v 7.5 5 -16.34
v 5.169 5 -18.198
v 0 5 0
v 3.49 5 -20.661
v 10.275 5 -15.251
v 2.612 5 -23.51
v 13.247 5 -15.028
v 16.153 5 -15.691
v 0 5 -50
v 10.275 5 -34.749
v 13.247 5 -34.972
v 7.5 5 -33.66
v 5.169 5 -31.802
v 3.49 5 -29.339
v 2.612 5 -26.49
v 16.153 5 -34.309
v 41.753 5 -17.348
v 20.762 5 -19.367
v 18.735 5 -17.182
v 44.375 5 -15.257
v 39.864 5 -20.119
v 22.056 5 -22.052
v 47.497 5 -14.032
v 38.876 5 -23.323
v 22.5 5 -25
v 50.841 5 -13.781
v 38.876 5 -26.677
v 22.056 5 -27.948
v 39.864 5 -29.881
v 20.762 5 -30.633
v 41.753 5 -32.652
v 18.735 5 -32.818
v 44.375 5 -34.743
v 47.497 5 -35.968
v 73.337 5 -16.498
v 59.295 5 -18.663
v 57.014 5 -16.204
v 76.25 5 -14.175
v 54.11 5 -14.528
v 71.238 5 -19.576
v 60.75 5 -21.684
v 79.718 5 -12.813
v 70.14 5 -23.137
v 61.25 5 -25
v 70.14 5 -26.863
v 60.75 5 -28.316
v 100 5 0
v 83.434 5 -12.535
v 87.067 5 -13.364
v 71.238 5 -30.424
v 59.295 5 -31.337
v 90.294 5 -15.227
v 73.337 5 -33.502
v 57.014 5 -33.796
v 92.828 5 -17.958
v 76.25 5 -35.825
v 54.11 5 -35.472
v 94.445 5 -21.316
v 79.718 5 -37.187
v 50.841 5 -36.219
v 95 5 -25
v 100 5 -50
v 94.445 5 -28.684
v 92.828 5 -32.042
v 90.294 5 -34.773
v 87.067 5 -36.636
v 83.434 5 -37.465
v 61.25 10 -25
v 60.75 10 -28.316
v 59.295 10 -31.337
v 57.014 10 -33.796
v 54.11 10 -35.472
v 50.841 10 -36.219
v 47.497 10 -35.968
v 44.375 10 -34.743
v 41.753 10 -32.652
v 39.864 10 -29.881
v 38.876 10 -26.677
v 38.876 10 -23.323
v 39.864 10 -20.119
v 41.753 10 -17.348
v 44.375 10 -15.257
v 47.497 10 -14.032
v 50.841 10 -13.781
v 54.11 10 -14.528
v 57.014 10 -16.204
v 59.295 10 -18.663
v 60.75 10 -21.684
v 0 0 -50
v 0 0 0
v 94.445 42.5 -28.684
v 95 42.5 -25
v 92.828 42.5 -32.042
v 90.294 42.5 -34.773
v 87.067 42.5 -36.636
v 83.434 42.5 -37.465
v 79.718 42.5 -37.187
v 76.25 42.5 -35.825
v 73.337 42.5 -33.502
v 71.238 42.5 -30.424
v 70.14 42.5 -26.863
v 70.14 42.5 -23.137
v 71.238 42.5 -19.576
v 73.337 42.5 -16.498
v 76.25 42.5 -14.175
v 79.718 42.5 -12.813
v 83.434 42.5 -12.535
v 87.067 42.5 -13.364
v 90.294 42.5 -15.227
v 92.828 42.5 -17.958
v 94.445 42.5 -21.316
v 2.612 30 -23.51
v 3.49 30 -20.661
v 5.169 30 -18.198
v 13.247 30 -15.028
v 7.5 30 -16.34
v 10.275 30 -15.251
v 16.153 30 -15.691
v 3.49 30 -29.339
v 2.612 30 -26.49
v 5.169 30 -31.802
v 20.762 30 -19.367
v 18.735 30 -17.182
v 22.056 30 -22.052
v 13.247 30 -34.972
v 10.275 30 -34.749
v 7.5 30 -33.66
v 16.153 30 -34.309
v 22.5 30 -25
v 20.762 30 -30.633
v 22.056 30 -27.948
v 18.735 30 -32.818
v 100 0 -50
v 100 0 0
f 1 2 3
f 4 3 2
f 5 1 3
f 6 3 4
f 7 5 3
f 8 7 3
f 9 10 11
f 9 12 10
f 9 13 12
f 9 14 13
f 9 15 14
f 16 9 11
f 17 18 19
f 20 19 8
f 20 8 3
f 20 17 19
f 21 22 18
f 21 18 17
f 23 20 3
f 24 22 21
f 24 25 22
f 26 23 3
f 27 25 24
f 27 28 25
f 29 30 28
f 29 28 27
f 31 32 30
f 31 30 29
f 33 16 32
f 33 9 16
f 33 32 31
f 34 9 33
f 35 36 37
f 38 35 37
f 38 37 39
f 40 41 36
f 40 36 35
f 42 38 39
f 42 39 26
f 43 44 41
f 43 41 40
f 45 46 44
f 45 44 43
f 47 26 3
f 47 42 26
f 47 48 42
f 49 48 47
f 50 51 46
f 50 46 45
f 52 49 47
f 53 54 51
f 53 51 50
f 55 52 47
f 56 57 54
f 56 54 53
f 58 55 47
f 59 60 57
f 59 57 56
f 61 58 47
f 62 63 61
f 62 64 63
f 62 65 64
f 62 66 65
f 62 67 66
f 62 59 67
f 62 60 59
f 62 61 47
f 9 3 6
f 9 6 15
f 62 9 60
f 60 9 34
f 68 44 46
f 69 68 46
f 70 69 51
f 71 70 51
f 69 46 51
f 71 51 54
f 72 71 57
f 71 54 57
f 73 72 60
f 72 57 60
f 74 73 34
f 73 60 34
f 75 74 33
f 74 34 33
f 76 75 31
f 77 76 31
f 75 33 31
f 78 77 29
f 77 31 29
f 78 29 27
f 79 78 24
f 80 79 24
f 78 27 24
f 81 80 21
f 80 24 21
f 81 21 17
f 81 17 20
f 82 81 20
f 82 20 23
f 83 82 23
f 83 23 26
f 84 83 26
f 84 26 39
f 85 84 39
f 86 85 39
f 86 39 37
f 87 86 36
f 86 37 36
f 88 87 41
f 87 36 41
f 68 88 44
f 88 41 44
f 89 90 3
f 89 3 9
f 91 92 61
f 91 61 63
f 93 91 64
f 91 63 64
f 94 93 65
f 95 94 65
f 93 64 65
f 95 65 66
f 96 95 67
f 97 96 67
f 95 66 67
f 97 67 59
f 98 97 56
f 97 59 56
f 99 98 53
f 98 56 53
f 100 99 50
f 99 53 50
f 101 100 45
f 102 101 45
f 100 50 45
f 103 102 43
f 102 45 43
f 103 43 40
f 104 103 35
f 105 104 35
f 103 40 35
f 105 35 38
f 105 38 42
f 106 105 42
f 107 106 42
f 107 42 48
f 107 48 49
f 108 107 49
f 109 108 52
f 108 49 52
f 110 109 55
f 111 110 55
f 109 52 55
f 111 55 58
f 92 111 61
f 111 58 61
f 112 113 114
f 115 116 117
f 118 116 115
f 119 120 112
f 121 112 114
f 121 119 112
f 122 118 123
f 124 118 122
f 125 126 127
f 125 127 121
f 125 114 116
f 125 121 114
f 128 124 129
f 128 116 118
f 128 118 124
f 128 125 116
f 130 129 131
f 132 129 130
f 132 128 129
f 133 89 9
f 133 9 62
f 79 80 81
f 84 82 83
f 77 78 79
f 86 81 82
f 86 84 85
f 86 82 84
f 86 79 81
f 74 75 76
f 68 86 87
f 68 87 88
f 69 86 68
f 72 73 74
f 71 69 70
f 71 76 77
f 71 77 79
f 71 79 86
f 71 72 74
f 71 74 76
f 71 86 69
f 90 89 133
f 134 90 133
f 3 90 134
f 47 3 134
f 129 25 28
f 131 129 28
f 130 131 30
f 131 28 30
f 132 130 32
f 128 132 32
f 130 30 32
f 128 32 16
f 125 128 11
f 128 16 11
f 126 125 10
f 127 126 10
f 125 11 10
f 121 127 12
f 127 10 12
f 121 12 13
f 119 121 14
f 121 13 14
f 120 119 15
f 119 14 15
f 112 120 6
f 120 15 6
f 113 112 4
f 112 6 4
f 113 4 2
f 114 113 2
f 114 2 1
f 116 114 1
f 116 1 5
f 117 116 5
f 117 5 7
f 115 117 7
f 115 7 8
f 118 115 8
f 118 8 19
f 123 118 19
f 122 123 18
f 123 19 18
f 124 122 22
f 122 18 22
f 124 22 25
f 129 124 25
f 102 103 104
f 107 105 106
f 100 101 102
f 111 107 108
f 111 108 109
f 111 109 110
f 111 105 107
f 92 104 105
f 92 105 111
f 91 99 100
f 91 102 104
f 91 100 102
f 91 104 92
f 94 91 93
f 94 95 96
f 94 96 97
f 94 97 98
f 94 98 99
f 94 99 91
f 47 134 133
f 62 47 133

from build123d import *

# Parameters (mm, degrees)
SKETCH1_W           = 100
SKETCH1_H           = 50
BOSS_EXTRUDE1_DEPTH = 5
SKETCH3_R           = 10
BOSS_EXTRUDE2_DEPTH = 25
SKETCH4_R           = 11.25
BOSS_EXTRUDE3_DEPTH = 5
SKETCH5_R           = 12.5
BOSS_EXTRUDE4_DEPTH = 37.5


with BuildPart() as part:
    # Sketch1 → Boss-Extrude1 (new body)
    with BuildSketch(Plane(origin=(0, 0, 0), x_dir=(1, 0, 0), z_dir=(0, 1, 0))):
        with Locations((50, 25)):
            Rectangle(SKETCH1_W, SKETCH1_H)
    extrude(amount=BOSS_EXTRUDE1_DEPTH)

    # Sketch3 → Boss-Extrude2 (add)
    with BuildSketch(Plane(origin=(0, 5, 0), x_dir=(1, 0, 0), z_dir=(0, 1, 0))):
        with Locations((12.5, 25)):
            Circle(SKETCH3_R)
    extrude(amount=BOSS_EXTRUDE2_DEPTH)

    # Sketch4 → Boss-Extrude3 (add)
    with BuildSketch(Plane(origin=(0, 5, 0), x_dir=(1, 0, 0), z_dir=(0, 1, 0))):
        with Locations((50, 25)):
            Circle(SKETCH4_R)
    extrude(amount=BOSS_EXTRUDE3_DEPTH)

    # Sketch5 → Boss-Extrude4 (add)
    with BuildSketch(Plane(origin=(0, 5, 0), x_dir=(1, 0, 0), z_dir=(0, 1, 0))):
        with Locations((82.5, 25)):
            Circle(SKETCH5_R)
    extrude(amount=BOSS_EXTRUDE4_DEPTH)


solid = part.part
